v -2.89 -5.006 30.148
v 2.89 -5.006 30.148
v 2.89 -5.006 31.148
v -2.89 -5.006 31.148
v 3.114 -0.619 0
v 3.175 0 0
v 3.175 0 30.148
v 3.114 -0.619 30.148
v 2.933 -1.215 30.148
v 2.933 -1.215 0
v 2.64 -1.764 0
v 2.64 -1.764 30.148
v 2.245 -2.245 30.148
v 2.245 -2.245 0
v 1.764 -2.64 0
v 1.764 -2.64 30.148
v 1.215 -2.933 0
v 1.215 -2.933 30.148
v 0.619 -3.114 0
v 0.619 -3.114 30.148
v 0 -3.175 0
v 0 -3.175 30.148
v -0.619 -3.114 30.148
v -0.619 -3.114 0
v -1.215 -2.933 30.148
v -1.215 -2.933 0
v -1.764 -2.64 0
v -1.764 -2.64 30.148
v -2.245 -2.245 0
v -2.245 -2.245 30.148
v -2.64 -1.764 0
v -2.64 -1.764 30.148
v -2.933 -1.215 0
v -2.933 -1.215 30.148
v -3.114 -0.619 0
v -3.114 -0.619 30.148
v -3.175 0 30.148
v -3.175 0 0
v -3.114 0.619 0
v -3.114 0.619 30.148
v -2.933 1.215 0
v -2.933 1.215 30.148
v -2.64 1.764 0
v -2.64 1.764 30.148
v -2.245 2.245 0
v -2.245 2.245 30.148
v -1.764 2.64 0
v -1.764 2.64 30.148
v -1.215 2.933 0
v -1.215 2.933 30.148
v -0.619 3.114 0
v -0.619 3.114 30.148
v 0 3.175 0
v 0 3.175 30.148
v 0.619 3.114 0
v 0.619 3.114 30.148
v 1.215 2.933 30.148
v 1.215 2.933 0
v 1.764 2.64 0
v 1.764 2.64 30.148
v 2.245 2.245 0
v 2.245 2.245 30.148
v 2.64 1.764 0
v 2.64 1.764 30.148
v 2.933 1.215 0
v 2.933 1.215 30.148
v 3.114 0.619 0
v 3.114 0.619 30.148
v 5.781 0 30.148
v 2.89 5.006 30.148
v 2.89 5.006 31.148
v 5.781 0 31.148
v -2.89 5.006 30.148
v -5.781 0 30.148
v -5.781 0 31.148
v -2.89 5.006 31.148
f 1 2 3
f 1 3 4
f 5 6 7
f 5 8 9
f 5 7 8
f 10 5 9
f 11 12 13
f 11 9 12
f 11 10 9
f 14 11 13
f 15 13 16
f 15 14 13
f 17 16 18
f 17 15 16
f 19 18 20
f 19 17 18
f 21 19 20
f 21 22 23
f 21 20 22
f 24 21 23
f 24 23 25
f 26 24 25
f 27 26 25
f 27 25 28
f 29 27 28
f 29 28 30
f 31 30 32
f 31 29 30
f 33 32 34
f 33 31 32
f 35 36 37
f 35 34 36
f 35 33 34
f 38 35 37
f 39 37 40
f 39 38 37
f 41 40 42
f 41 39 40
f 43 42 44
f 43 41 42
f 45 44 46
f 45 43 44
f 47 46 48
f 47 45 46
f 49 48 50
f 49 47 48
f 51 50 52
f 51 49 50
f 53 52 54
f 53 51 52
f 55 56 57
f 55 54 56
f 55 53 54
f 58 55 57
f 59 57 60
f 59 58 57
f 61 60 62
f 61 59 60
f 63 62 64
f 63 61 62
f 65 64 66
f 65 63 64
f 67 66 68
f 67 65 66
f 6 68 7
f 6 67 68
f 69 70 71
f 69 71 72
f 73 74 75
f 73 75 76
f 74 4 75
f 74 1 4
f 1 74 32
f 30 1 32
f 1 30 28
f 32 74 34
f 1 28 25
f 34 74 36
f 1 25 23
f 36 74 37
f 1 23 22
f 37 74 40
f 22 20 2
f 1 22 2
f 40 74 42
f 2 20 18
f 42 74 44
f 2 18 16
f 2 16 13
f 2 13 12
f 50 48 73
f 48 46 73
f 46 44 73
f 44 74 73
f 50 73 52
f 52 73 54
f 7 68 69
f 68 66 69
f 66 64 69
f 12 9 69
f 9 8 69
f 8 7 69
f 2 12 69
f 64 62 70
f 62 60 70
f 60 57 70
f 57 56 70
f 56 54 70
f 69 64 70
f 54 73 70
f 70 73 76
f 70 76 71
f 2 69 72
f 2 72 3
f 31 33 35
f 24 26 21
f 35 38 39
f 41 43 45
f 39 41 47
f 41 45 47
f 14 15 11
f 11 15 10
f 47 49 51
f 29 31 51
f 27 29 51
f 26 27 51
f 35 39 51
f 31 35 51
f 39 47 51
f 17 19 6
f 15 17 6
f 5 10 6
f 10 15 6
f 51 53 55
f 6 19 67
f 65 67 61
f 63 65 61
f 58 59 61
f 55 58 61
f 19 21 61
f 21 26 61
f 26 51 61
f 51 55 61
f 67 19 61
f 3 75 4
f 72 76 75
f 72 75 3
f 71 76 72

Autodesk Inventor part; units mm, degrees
ref_plane "YZ Plane" through (0, 0, 0) normal (1, 0, 0) x (0, 1, 0)
ref_plane "XZ Plane" through (0, 0, 0) normal (0, 1, 0) x (-1, 0, 0)
ref_plane "XY Plane" through (0, 0, 0) normal (0, 0, 1) x (1, 0, 0)
sketch "Sketch1" plane through (0, 0, 0) normal (0, 0, 1) x (1, 0, 0)
  circle A0 centre (0, 0) radius 3.175
  dimension "d0" = 6.35
extrude "Extrusion1" add sketch "Sketch1" along normal blind 30.148
sketch "Sketch2" plane through (0, 0, 30.148) normal (0, 0, 1) x (1, 0, 0)
  line L0 (5.7808, 0) -> (2.8904, -5.0064)
  line L1 (2.8904, -5.0064) -> (-2.8904, -5.0064)
  line L2 (-2.8904, -5.0064) -> (-5.7808, 0)
  line L3 (-5.7808, 0) -> (-2.8904, 5.0064)
  line L4 (-2.8904, 5.0064) -> (2.8904, 5.0064)
  line L5 (2.8904, 5.0064) -> (5.7808, 0)
  point P0 (0, 0)
  point P1 (0, 0)
extrude "Extrusion2" add sketch "Sketch2" along normal blind 1
thread "Thread1" size "1/4-20 UNC" class "2A" standard "ANSI Unified Screw Threads" full length
properties part number "Pedal Bolt Outside Right"
